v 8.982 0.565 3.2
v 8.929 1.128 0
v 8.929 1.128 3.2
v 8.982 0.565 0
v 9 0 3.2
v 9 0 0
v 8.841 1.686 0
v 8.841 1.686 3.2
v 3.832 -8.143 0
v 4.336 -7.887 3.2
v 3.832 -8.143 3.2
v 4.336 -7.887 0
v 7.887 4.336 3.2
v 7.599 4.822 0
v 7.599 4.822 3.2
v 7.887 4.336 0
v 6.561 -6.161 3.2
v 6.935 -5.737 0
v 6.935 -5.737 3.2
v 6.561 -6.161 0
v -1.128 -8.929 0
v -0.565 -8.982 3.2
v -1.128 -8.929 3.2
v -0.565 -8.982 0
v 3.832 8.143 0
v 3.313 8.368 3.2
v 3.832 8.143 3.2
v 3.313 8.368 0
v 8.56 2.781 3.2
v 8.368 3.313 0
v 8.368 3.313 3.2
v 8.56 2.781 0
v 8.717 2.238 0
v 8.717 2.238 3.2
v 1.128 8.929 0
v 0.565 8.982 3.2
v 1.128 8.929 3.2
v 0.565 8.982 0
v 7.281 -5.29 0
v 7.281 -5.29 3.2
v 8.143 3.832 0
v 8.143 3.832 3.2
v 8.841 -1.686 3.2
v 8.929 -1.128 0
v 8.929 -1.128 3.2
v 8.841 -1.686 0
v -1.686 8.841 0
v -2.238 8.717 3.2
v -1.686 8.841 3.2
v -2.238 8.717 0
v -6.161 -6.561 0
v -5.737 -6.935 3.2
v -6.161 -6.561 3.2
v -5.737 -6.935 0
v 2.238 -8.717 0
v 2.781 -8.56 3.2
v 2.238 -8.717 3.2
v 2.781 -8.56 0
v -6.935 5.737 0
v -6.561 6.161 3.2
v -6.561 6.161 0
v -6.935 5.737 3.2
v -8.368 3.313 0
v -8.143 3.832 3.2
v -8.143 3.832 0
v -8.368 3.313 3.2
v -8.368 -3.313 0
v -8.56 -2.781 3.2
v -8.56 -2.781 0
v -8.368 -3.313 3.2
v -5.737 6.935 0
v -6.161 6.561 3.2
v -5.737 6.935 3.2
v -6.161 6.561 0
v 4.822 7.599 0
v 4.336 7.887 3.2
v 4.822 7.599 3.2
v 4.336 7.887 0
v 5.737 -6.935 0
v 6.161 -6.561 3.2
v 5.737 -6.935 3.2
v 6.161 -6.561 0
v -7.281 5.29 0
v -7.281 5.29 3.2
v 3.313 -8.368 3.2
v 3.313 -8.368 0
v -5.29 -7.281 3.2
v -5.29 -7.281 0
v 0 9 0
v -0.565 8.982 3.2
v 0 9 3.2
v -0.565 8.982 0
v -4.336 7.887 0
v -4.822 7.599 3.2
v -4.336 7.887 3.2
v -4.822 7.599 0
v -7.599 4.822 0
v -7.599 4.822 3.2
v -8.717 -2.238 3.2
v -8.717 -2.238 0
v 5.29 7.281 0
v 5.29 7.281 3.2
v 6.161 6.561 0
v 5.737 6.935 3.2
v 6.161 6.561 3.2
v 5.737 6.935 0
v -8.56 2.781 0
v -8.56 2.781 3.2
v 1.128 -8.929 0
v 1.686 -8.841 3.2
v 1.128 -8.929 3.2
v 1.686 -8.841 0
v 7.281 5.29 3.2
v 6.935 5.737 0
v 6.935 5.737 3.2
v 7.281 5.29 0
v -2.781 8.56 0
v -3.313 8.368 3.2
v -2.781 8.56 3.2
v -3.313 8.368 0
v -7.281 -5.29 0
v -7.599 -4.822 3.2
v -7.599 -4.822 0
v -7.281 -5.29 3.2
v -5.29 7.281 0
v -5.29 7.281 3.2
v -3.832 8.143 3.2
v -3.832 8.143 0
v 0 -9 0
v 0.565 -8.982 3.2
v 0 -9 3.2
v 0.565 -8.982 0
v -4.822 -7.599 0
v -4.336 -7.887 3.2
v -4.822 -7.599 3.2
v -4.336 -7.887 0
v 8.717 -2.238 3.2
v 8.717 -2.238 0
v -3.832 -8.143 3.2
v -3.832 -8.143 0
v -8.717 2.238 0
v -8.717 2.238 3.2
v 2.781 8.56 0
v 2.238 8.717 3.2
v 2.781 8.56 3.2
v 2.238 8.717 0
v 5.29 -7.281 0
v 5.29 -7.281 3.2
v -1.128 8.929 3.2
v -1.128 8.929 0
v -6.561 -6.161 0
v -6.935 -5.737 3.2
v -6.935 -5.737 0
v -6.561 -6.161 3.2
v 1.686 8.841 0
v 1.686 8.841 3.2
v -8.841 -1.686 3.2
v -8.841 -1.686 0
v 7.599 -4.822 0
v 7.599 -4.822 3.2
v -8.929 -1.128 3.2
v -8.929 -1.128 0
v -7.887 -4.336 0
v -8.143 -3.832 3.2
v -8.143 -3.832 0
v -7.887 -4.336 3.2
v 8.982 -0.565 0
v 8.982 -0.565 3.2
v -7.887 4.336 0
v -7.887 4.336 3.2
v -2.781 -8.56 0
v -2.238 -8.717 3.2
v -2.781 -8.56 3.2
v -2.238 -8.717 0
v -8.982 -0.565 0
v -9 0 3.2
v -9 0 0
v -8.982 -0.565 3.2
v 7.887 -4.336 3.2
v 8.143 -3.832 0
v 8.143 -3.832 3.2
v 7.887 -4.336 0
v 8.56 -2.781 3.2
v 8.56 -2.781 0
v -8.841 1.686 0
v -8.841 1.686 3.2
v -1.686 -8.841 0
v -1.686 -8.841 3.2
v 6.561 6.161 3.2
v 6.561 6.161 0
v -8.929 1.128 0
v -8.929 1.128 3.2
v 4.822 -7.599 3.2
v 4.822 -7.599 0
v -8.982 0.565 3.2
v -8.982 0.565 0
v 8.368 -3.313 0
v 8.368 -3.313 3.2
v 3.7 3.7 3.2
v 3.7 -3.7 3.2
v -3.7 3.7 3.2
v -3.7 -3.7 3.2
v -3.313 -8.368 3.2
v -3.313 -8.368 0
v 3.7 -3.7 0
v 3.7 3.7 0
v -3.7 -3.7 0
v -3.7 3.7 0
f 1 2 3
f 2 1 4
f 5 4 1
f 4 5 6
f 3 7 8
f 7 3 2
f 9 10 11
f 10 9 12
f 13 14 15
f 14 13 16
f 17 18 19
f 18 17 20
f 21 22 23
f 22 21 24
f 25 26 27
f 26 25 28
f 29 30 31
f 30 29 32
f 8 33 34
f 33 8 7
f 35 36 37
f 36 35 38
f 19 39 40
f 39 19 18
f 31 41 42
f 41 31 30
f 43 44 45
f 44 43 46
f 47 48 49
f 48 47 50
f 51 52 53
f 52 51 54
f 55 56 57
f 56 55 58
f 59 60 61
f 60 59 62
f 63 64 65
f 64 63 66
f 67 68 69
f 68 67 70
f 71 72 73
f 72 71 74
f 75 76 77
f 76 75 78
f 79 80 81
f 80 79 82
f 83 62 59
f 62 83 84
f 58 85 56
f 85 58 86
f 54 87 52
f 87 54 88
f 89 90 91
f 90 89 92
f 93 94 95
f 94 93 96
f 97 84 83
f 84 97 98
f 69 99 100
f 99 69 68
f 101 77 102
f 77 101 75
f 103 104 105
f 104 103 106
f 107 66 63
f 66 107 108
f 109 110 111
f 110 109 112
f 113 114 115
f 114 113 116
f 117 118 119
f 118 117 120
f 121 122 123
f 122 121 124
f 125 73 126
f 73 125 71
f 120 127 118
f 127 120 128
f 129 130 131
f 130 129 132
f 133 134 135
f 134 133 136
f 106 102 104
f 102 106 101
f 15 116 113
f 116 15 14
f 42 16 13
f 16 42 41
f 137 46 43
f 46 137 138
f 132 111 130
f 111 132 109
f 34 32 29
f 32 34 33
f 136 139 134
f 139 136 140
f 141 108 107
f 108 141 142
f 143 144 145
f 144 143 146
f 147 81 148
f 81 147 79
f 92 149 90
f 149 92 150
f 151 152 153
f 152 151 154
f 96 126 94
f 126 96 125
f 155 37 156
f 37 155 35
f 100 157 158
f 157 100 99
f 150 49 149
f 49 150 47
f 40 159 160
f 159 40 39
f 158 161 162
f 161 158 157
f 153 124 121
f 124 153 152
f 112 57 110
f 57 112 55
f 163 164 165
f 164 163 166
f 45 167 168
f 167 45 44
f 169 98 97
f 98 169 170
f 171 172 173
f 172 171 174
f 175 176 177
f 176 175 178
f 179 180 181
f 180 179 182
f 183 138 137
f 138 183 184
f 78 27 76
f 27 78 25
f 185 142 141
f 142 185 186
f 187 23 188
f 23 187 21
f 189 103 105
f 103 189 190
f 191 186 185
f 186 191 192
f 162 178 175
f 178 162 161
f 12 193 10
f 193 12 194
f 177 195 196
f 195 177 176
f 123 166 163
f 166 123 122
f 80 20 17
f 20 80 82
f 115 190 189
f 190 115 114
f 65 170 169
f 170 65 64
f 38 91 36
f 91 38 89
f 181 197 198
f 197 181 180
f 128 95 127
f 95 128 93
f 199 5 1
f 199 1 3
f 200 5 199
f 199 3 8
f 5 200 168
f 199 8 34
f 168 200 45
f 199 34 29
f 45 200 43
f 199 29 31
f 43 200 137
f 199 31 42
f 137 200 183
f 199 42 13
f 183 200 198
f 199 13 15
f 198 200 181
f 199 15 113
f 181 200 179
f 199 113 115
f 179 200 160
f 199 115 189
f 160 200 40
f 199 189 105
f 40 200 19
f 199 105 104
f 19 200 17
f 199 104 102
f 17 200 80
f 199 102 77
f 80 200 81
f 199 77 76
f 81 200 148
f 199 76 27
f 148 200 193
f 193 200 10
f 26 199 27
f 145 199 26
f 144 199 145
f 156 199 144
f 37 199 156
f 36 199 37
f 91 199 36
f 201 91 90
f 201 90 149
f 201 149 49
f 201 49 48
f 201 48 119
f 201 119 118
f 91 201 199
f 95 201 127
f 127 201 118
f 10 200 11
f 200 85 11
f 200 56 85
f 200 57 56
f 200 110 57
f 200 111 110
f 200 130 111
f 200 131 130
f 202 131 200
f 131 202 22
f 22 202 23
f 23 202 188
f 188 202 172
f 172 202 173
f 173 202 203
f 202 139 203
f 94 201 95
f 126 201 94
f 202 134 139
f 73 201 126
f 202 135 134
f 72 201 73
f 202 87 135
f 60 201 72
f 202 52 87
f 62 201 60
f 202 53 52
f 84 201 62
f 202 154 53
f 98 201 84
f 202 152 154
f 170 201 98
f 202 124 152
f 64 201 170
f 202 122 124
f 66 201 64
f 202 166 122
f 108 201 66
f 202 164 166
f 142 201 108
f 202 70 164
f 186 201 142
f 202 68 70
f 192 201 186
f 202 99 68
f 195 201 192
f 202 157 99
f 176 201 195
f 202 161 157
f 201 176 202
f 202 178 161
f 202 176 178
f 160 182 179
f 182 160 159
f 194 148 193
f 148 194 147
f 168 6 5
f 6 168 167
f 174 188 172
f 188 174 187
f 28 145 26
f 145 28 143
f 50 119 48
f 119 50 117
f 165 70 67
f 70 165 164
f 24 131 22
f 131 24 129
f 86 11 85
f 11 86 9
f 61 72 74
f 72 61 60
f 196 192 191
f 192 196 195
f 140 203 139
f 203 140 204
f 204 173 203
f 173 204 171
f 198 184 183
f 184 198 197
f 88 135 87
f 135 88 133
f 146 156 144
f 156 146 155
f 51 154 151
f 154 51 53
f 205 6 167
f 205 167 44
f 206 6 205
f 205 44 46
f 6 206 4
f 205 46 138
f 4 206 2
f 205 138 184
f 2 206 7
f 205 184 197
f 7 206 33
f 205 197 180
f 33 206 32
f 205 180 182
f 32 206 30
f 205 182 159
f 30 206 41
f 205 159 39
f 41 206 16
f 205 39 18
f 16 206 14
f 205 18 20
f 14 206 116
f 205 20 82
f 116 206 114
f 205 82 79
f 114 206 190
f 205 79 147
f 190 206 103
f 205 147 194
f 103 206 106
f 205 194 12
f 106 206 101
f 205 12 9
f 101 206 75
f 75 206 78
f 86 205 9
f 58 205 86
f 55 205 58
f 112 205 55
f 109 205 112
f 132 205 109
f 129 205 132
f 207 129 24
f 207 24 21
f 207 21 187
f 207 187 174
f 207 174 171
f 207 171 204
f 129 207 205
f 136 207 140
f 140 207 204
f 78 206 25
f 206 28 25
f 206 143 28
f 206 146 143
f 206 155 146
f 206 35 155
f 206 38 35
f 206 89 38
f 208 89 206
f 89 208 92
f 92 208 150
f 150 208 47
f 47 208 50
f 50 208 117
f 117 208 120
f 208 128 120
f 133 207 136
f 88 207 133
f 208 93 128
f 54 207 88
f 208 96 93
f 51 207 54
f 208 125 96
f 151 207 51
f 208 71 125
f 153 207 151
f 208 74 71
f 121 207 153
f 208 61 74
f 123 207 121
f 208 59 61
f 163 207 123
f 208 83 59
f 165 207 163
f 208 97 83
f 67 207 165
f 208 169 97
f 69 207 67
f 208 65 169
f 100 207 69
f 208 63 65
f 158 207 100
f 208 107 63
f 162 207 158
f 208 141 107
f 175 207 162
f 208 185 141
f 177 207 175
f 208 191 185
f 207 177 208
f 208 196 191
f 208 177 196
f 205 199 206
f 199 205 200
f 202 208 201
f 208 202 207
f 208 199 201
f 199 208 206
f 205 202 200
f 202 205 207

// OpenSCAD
$fn=100;
difference(){
  union(){
    cylinder(d=18, h=3.2);
  }
cube([7.4, 7.4, 40], center=true);
};
